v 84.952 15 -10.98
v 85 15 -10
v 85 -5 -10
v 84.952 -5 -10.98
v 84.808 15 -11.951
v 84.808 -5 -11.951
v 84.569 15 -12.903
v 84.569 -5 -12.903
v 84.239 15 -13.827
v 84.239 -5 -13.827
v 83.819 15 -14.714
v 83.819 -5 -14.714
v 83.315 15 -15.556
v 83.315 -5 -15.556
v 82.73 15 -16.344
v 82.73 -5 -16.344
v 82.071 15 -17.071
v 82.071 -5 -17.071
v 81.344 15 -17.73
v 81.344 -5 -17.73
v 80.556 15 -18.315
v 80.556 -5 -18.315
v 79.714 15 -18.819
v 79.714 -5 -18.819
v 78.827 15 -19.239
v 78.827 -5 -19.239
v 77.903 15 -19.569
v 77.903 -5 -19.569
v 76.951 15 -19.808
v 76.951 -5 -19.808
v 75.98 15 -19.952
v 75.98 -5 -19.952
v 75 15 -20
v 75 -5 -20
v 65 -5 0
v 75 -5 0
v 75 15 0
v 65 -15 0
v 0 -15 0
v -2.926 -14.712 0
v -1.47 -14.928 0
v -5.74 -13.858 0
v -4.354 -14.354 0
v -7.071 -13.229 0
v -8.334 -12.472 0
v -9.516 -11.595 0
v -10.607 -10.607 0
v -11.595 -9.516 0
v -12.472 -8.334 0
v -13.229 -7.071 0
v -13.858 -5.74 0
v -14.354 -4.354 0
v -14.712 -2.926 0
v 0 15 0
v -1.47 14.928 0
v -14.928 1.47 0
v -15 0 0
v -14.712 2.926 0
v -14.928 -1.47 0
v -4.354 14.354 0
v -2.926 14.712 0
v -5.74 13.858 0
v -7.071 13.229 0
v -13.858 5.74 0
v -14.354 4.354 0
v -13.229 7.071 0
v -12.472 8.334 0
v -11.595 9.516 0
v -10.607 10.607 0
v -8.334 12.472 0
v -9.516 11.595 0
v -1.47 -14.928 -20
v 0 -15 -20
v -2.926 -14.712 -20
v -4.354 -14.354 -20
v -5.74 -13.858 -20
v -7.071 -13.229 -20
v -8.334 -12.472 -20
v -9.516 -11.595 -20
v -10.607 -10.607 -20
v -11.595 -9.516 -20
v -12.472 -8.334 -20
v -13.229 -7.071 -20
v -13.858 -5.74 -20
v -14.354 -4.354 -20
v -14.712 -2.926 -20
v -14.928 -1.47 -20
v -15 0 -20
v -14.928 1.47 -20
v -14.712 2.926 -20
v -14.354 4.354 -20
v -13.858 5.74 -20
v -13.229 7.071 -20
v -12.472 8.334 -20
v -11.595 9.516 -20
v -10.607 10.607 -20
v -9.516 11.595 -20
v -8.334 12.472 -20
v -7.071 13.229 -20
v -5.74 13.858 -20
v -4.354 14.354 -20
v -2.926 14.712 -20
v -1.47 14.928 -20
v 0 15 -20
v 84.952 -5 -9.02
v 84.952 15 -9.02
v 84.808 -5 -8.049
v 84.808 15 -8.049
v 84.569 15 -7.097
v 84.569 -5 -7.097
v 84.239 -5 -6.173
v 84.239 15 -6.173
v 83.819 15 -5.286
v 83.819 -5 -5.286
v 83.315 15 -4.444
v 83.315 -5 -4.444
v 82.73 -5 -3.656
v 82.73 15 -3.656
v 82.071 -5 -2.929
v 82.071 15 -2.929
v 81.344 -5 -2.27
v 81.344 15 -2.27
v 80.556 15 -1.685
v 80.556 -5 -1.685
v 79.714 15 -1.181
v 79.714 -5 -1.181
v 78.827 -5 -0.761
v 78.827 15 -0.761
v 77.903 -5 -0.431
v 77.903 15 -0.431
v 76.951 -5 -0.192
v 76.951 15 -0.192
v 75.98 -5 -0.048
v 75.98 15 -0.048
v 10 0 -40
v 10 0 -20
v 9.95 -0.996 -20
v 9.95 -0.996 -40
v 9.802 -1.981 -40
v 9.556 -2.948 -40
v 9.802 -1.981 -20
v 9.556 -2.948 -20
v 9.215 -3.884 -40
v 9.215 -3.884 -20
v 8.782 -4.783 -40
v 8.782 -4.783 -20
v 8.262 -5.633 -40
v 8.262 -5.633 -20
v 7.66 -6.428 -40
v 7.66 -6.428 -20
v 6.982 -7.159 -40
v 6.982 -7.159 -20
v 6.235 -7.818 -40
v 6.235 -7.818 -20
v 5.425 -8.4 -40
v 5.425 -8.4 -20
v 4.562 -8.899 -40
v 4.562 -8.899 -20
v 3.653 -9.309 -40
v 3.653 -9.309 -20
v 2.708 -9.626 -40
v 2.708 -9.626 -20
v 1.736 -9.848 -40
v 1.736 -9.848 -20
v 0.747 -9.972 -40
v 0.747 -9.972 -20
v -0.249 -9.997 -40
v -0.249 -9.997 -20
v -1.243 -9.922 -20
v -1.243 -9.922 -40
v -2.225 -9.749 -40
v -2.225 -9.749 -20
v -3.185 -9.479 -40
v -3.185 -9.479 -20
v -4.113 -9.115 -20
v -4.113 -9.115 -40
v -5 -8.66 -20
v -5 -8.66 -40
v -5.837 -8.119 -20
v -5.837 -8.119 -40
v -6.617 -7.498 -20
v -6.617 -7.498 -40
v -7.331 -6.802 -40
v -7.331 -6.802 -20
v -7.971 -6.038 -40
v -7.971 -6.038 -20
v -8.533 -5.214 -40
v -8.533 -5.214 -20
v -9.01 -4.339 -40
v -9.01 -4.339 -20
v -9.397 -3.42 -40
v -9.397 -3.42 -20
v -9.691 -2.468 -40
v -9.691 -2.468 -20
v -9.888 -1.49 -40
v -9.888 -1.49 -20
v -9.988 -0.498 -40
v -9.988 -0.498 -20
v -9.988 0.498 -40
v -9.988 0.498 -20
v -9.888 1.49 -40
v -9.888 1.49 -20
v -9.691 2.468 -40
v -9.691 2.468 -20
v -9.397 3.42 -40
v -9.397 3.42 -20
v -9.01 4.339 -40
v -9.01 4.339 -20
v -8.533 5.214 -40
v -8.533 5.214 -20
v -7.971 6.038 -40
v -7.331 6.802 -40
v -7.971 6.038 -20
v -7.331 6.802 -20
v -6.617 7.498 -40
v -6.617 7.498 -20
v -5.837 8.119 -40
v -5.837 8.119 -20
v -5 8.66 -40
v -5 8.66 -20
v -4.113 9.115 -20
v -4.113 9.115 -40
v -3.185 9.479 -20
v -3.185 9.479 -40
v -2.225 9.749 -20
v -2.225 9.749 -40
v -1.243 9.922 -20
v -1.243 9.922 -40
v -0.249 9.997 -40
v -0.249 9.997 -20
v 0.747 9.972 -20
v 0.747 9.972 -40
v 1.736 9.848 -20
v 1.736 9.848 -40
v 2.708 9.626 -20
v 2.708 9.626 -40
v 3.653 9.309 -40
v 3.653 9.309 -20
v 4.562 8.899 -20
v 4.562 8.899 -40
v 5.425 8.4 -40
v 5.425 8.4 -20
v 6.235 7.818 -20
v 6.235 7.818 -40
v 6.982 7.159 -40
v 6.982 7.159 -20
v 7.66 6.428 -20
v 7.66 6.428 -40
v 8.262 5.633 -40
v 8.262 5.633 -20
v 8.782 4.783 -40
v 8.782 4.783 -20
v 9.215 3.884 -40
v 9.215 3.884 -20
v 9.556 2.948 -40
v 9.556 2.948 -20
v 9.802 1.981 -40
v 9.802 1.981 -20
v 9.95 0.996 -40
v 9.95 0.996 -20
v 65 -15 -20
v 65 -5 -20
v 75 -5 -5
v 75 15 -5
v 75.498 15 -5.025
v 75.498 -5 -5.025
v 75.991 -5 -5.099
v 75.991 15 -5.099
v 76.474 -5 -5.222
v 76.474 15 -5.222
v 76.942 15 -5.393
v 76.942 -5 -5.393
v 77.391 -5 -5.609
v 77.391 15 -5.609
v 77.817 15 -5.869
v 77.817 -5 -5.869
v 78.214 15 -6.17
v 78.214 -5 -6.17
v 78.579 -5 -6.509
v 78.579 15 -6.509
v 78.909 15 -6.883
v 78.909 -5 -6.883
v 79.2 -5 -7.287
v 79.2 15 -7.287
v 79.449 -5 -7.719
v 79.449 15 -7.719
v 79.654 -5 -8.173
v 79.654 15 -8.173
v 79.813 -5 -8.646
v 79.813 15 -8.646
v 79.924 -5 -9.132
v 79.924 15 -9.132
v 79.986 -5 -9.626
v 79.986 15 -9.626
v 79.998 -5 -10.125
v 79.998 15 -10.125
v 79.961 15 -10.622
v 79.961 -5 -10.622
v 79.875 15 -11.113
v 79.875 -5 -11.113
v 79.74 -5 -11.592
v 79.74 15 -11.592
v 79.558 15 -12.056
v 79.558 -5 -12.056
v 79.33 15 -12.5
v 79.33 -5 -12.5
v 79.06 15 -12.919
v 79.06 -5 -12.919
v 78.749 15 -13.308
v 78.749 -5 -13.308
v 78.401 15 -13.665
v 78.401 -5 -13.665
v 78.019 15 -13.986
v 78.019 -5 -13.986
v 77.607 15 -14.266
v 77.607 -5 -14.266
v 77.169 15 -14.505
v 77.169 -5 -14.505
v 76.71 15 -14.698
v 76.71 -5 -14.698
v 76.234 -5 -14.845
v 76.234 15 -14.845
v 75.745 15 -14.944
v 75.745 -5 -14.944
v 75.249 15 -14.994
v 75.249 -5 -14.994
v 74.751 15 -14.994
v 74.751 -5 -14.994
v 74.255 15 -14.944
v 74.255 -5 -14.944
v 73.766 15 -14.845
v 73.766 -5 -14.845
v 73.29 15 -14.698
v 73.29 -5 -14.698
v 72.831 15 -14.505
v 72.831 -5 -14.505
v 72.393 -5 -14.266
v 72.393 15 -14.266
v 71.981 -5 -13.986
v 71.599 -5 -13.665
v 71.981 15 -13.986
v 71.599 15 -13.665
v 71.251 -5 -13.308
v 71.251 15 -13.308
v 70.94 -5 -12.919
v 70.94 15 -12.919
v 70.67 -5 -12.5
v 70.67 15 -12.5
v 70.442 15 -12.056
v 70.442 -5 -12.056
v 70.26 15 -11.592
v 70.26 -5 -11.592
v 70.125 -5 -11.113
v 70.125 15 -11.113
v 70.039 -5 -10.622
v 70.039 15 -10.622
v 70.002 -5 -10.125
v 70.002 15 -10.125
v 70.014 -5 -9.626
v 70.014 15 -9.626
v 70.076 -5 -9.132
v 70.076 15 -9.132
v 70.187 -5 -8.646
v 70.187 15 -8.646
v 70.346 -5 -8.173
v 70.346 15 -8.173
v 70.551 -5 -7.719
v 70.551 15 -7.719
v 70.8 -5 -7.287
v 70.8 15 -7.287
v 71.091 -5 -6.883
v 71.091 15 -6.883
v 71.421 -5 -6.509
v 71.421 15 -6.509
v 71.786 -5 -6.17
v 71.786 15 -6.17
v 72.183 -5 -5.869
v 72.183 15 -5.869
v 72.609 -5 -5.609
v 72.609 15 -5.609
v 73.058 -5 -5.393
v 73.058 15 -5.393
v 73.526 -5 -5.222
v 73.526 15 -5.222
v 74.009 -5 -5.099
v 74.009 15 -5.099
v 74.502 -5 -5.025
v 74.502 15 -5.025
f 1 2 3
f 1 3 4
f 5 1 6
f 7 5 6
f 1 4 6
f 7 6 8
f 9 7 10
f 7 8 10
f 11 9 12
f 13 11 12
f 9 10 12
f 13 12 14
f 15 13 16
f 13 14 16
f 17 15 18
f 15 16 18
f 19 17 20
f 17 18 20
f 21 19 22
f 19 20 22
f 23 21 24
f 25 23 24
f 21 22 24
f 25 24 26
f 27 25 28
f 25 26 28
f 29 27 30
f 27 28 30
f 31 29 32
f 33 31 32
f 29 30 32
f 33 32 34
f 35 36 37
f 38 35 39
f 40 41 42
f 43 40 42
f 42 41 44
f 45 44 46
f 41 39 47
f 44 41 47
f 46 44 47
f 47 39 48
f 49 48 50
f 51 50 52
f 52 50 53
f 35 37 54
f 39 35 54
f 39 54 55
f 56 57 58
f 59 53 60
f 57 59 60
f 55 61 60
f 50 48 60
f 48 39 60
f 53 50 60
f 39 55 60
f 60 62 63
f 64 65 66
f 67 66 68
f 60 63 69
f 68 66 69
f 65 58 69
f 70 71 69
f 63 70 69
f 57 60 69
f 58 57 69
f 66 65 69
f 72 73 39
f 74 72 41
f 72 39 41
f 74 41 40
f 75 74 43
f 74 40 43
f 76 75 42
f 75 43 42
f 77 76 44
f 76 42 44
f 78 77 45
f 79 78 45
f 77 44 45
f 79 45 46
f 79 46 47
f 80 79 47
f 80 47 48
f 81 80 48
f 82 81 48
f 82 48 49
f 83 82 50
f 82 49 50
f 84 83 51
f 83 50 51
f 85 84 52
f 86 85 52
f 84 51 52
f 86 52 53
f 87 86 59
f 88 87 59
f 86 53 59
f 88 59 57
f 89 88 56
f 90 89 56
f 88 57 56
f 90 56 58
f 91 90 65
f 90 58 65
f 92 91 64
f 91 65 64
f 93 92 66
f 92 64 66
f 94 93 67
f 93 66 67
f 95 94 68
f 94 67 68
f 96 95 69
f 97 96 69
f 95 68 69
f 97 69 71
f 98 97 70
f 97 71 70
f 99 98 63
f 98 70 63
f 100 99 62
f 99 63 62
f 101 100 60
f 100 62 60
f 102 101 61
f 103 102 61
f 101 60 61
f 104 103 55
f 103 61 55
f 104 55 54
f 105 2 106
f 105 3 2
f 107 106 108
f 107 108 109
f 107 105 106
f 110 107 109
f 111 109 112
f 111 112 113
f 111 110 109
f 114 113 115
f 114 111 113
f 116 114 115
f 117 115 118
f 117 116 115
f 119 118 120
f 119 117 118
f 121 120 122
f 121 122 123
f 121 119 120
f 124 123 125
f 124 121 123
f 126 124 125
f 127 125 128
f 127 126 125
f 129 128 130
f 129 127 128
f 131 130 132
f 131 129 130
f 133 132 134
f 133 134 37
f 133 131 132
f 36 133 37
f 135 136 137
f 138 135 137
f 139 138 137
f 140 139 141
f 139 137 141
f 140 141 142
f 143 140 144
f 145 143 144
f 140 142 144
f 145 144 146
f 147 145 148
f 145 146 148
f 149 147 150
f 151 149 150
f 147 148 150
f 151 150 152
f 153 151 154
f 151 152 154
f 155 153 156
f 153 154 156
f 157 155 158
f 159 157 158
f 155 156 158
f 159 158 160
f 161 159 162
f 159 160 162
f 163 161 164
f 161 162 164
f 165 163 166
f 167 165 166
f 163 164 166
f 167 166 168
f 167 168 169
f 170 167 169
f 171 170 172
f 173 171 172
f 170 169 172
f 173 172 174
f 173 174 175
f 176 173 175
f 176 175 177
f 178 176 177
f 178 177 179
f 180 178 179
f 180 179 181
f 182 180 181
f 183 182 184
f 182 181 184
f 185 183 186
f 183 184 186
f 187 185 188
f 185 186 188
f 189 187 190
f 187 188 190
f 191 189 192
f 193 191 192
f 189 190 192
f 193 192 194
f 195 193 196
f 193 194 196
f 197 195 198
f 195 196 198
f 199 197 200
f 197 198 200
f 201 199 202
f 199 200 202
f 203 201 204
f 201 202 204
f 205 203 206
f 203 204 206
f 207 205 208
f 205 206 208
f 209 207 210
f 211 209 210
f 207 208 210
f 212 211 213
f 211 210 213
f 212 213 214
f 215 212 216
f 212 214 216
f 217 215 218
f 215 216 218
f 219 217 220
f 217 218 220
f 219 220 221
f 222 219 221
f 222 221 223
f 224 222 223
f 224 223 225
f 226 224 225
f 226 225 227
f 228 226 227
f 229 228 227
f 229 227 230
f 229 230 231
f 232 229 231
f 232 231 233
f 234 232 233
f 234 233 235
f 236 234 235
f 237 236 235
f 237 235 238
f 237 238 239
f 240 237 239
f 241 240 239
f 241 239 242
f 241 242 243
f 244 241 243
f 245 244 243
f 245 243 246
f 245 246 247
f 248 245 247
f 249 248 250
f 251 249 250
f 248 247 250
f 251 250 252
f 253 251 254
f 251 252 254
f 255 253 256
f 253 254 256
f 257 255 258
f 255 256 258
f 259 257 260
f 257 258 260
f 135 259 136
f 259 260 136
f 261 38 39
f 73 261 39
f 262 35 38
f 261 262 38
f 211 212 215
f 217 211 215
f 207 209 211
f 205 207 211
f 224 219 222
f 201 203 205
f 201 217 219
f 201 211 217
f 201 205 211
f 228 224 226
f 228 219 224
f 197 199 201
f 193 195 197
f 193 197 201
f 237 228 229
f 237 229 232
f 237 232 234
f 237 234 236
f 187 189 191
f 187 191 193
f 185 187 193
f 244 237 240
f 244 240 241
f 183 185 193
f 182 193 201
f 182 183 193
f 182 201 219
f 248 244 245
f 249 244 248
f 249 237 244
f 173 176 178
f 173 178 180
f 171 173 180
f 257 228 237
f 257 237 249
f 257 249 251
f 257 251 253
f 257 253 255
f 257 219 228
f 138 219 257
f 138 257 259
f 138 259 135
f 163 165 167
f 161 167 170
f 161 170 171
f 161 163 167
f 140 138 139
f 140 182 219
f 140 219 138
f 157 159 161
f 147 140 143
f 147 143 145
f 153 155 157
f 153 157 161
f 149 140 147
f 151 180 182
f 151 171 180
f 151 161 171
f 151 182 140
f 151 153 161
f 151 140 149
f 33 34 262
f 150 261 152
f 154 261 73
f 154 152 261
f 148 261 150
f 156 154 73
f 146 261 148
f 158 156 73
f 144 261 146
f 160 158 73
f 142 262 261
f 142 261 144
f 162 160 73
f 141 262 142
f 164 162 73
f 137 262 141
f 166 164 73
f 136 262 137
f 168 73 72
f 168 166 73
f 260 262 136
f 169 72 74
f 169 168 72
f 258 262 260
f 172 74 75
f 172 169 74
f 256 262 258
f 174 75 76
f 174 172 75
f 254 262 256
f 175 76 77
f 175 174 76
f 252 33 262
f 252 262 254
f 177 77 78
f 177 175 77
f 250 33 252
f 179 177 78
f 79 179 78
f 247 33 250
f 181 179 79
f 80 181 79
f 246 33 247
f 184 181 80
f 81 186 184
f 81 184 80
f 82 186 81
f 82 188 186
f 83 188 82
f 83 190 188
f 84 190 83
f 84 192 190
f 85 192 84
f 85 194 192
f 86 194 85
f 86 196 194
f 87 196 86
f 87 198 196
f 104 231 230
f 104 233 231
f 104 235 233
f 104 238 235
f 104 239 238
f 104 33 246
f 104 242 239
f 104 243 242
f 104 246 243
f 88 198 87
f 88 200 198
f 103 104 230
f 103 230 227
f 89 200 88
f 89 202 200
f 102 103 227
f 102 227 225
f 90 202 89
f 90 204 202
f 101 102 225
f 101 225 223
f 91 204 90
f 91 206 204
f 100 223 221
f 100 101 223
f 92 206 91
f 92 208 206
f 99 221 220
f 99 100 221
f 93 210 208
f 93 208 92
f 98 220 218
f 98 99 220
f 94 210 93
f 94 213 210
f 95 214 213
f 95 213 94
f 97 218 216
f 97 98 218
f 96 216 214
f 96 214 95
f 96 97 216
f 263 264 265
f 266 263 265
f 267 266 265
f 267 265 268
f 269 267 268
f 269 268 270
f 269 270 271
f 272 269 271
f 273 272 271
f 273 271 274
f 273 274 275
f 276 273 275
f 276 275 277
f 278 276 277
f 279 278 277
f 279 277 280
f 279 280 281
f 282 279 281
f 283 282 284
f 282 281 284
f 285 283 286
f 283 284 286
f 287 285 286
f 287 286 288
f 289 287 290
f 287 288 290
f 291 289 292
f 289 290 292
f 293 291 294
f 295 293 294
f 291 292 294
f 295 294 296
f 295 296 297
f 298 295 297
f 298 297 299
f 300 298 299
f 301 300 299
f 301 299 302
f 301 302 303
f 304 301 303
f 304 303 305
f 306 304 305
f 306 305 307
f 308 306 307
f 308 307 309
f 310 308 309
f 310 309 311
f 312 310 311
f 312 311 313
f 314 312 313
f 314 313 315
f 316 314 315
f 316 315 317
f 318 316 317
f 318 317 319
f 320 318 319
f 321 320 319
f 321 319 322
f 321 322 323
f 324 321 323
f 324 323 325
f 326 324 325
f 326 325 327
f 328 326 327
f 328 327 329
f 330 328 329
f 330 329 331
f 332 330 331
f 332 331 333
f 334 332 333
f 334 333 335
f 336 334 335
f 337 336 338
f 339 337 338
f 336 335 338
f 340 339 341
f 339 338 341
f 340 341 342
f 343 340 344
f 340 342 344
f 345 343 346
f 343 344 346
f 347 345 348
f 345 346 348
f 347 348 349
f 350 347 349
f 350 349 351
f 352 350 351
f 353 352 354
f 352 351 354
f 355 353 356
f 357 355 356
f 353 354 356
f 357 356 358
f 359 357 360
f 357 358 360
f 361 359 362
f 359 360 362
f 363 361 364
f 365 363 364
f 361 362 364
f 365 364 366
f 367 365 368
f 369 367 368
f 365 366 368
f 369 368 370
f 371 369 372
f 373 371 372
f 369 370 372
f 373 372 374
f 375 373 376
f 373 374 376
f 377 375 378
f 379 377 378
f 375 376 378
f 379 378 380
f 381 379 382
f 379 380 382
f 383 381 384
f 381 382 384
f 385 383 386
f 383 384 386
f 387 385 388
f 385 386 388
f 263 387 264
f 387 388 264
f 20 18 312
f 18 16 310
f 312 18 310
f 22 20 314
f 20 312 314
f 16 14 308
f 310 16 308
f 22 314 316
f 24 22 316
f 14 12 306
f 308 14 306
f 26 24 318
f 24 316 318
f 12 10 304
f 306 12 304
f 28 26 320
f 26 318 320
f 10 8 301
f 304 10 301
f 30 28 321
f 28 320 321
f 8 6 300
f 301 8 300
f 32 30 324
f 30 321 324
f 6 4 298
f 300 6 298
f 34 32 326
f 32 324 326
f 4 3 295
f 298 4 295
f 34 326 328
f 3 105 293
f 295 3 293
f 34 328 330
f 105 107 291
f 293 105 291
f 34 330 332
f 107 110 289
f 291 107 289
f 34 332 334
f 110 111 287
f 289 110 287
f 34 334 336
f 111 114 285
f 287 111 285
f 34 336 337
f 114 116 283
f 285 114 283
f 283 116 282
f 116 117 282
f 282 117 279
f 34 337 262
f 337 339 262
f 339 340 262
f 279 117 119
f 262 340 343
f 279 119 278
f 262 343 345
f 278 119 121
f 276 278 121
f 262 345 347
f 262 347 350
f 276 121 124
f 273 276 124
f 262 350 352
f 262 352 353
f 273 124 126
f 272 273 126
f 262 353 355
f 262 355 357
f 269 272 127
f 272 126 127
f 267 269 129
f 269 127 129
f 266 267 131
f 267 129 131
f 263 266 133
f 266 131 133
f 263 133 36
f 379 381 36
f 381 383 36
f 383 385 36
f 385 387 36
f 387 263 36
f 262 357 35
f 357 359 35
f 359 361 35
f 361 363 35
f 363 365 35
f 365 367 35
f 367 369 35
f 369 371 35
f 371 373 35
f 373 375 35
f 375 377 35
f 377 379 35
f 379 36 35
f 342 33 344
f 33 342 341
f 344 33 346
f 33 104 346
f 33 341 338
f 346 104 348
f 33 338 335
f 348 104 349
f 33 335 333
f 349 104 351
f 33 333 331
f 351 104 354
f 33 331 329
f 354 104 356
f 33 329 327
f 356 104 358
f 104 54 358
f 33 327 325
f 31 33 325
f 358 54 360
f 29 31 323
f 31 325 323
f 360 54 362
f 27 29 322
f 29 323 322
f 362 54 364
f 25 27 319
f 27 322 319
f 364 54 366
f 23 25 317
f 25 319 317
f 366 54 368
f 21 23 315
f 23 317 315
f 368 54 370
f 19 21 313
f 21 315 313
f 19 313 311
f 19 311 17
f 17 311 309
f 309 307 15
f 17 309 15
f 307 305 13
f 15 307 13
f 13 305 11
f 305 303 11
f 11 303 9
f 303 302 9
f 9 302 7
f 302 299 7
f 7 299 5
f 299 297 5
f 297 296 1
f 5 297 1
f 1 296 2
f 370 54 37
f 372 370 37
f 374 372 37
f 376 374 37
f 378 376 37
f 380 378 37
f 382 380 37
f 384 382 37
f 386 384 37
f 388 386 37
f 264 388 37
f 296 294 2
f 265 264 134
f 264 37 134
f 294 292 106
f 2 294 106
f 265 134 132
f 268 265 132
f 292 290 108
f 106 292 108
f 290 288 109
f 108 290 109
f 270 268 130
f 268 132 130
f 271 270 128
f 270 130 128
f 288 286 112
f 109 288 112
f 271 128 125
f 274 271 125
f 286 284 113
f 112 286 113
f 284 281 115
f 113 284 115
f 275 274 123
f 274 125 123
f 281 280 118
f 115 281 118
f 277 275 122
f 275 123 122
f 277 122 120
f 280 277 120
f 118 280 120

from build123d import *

# Parameters (mm, degrees)
BOSS_EXTRUDE1_DEPTH = 20
FILLET1_R           = 10
CUT_EXTRUDE1_REACH  = 94.331
SKETCH4_R           = 5
SKETCH5_R           = 10
BOSS_EXTRUDE2_DEPTH = 20


with BuildPart() as part:
    # Sketch1 → Boss-Extrude1 (new body)
    with BuildSketch(Plane.XY):
        with BuildLine():
            Line((0, 15), (85, 15))
            Line((85, 15), (85, -5))
            Line((85, -5), (65, -5))
            Line((65, -5), (65, -15))
            Line((65, -15), (0, -15))
            ThreePointArc((0, -15), (-15, 0), (0, 15))
        make_face()
    extrude(amount=-BOSS_EXTRUDE1_DEPTH)

    # Fillet1
    fillet1_edges = [part.edges().sort_by_distance(p)[0] for p in [
        (85, 5, 0),
        (85, 5, -20),
    ]]
    fillet(fillet1_edges, radius=FILLET1_R - 0.0001)  # a hair under: the kernel refuses the full size

    # Sketch4 → Cut-Extrude1 (cut, up to next)
    with BuildSketch(Plane(origin=(0, 15, 0), x_dir=(1, 0, 0), z_dir=(0, 1, 0)), mode=Mode.PRIVATE) as cut_extrude1_sk1:
        with Locations(Location((75, 10, 0), (0, 0, 270))):
            Circle(SKETCH4_R)
    cut_extrude1_tool1 = extrude(cut_extrude1_sk1.sketch, amount=-CUT_EXTRUDE1_REACH, mode=Mode.PRIVATE) & part.part
    add(cut_extrude1_tool1.solids().sort_by_distance((75, 15, -10))[0], mode=Mode.SUBTRACT)

    # Sketch5 → Boss-Extrude2 (add)
    with BuildSketch(Plane(origin=(0, 0, -20), x_dir=(-1, 0, 0), z_dir=(0, 0, -1))):
        with Locations(Location((0, 0, 0), (0, 0, 180))):
            Circle(SKETCH5_R)
    extrude(amount=BOSS_EXTRUDE2_DEPTH)


solid = part.part
